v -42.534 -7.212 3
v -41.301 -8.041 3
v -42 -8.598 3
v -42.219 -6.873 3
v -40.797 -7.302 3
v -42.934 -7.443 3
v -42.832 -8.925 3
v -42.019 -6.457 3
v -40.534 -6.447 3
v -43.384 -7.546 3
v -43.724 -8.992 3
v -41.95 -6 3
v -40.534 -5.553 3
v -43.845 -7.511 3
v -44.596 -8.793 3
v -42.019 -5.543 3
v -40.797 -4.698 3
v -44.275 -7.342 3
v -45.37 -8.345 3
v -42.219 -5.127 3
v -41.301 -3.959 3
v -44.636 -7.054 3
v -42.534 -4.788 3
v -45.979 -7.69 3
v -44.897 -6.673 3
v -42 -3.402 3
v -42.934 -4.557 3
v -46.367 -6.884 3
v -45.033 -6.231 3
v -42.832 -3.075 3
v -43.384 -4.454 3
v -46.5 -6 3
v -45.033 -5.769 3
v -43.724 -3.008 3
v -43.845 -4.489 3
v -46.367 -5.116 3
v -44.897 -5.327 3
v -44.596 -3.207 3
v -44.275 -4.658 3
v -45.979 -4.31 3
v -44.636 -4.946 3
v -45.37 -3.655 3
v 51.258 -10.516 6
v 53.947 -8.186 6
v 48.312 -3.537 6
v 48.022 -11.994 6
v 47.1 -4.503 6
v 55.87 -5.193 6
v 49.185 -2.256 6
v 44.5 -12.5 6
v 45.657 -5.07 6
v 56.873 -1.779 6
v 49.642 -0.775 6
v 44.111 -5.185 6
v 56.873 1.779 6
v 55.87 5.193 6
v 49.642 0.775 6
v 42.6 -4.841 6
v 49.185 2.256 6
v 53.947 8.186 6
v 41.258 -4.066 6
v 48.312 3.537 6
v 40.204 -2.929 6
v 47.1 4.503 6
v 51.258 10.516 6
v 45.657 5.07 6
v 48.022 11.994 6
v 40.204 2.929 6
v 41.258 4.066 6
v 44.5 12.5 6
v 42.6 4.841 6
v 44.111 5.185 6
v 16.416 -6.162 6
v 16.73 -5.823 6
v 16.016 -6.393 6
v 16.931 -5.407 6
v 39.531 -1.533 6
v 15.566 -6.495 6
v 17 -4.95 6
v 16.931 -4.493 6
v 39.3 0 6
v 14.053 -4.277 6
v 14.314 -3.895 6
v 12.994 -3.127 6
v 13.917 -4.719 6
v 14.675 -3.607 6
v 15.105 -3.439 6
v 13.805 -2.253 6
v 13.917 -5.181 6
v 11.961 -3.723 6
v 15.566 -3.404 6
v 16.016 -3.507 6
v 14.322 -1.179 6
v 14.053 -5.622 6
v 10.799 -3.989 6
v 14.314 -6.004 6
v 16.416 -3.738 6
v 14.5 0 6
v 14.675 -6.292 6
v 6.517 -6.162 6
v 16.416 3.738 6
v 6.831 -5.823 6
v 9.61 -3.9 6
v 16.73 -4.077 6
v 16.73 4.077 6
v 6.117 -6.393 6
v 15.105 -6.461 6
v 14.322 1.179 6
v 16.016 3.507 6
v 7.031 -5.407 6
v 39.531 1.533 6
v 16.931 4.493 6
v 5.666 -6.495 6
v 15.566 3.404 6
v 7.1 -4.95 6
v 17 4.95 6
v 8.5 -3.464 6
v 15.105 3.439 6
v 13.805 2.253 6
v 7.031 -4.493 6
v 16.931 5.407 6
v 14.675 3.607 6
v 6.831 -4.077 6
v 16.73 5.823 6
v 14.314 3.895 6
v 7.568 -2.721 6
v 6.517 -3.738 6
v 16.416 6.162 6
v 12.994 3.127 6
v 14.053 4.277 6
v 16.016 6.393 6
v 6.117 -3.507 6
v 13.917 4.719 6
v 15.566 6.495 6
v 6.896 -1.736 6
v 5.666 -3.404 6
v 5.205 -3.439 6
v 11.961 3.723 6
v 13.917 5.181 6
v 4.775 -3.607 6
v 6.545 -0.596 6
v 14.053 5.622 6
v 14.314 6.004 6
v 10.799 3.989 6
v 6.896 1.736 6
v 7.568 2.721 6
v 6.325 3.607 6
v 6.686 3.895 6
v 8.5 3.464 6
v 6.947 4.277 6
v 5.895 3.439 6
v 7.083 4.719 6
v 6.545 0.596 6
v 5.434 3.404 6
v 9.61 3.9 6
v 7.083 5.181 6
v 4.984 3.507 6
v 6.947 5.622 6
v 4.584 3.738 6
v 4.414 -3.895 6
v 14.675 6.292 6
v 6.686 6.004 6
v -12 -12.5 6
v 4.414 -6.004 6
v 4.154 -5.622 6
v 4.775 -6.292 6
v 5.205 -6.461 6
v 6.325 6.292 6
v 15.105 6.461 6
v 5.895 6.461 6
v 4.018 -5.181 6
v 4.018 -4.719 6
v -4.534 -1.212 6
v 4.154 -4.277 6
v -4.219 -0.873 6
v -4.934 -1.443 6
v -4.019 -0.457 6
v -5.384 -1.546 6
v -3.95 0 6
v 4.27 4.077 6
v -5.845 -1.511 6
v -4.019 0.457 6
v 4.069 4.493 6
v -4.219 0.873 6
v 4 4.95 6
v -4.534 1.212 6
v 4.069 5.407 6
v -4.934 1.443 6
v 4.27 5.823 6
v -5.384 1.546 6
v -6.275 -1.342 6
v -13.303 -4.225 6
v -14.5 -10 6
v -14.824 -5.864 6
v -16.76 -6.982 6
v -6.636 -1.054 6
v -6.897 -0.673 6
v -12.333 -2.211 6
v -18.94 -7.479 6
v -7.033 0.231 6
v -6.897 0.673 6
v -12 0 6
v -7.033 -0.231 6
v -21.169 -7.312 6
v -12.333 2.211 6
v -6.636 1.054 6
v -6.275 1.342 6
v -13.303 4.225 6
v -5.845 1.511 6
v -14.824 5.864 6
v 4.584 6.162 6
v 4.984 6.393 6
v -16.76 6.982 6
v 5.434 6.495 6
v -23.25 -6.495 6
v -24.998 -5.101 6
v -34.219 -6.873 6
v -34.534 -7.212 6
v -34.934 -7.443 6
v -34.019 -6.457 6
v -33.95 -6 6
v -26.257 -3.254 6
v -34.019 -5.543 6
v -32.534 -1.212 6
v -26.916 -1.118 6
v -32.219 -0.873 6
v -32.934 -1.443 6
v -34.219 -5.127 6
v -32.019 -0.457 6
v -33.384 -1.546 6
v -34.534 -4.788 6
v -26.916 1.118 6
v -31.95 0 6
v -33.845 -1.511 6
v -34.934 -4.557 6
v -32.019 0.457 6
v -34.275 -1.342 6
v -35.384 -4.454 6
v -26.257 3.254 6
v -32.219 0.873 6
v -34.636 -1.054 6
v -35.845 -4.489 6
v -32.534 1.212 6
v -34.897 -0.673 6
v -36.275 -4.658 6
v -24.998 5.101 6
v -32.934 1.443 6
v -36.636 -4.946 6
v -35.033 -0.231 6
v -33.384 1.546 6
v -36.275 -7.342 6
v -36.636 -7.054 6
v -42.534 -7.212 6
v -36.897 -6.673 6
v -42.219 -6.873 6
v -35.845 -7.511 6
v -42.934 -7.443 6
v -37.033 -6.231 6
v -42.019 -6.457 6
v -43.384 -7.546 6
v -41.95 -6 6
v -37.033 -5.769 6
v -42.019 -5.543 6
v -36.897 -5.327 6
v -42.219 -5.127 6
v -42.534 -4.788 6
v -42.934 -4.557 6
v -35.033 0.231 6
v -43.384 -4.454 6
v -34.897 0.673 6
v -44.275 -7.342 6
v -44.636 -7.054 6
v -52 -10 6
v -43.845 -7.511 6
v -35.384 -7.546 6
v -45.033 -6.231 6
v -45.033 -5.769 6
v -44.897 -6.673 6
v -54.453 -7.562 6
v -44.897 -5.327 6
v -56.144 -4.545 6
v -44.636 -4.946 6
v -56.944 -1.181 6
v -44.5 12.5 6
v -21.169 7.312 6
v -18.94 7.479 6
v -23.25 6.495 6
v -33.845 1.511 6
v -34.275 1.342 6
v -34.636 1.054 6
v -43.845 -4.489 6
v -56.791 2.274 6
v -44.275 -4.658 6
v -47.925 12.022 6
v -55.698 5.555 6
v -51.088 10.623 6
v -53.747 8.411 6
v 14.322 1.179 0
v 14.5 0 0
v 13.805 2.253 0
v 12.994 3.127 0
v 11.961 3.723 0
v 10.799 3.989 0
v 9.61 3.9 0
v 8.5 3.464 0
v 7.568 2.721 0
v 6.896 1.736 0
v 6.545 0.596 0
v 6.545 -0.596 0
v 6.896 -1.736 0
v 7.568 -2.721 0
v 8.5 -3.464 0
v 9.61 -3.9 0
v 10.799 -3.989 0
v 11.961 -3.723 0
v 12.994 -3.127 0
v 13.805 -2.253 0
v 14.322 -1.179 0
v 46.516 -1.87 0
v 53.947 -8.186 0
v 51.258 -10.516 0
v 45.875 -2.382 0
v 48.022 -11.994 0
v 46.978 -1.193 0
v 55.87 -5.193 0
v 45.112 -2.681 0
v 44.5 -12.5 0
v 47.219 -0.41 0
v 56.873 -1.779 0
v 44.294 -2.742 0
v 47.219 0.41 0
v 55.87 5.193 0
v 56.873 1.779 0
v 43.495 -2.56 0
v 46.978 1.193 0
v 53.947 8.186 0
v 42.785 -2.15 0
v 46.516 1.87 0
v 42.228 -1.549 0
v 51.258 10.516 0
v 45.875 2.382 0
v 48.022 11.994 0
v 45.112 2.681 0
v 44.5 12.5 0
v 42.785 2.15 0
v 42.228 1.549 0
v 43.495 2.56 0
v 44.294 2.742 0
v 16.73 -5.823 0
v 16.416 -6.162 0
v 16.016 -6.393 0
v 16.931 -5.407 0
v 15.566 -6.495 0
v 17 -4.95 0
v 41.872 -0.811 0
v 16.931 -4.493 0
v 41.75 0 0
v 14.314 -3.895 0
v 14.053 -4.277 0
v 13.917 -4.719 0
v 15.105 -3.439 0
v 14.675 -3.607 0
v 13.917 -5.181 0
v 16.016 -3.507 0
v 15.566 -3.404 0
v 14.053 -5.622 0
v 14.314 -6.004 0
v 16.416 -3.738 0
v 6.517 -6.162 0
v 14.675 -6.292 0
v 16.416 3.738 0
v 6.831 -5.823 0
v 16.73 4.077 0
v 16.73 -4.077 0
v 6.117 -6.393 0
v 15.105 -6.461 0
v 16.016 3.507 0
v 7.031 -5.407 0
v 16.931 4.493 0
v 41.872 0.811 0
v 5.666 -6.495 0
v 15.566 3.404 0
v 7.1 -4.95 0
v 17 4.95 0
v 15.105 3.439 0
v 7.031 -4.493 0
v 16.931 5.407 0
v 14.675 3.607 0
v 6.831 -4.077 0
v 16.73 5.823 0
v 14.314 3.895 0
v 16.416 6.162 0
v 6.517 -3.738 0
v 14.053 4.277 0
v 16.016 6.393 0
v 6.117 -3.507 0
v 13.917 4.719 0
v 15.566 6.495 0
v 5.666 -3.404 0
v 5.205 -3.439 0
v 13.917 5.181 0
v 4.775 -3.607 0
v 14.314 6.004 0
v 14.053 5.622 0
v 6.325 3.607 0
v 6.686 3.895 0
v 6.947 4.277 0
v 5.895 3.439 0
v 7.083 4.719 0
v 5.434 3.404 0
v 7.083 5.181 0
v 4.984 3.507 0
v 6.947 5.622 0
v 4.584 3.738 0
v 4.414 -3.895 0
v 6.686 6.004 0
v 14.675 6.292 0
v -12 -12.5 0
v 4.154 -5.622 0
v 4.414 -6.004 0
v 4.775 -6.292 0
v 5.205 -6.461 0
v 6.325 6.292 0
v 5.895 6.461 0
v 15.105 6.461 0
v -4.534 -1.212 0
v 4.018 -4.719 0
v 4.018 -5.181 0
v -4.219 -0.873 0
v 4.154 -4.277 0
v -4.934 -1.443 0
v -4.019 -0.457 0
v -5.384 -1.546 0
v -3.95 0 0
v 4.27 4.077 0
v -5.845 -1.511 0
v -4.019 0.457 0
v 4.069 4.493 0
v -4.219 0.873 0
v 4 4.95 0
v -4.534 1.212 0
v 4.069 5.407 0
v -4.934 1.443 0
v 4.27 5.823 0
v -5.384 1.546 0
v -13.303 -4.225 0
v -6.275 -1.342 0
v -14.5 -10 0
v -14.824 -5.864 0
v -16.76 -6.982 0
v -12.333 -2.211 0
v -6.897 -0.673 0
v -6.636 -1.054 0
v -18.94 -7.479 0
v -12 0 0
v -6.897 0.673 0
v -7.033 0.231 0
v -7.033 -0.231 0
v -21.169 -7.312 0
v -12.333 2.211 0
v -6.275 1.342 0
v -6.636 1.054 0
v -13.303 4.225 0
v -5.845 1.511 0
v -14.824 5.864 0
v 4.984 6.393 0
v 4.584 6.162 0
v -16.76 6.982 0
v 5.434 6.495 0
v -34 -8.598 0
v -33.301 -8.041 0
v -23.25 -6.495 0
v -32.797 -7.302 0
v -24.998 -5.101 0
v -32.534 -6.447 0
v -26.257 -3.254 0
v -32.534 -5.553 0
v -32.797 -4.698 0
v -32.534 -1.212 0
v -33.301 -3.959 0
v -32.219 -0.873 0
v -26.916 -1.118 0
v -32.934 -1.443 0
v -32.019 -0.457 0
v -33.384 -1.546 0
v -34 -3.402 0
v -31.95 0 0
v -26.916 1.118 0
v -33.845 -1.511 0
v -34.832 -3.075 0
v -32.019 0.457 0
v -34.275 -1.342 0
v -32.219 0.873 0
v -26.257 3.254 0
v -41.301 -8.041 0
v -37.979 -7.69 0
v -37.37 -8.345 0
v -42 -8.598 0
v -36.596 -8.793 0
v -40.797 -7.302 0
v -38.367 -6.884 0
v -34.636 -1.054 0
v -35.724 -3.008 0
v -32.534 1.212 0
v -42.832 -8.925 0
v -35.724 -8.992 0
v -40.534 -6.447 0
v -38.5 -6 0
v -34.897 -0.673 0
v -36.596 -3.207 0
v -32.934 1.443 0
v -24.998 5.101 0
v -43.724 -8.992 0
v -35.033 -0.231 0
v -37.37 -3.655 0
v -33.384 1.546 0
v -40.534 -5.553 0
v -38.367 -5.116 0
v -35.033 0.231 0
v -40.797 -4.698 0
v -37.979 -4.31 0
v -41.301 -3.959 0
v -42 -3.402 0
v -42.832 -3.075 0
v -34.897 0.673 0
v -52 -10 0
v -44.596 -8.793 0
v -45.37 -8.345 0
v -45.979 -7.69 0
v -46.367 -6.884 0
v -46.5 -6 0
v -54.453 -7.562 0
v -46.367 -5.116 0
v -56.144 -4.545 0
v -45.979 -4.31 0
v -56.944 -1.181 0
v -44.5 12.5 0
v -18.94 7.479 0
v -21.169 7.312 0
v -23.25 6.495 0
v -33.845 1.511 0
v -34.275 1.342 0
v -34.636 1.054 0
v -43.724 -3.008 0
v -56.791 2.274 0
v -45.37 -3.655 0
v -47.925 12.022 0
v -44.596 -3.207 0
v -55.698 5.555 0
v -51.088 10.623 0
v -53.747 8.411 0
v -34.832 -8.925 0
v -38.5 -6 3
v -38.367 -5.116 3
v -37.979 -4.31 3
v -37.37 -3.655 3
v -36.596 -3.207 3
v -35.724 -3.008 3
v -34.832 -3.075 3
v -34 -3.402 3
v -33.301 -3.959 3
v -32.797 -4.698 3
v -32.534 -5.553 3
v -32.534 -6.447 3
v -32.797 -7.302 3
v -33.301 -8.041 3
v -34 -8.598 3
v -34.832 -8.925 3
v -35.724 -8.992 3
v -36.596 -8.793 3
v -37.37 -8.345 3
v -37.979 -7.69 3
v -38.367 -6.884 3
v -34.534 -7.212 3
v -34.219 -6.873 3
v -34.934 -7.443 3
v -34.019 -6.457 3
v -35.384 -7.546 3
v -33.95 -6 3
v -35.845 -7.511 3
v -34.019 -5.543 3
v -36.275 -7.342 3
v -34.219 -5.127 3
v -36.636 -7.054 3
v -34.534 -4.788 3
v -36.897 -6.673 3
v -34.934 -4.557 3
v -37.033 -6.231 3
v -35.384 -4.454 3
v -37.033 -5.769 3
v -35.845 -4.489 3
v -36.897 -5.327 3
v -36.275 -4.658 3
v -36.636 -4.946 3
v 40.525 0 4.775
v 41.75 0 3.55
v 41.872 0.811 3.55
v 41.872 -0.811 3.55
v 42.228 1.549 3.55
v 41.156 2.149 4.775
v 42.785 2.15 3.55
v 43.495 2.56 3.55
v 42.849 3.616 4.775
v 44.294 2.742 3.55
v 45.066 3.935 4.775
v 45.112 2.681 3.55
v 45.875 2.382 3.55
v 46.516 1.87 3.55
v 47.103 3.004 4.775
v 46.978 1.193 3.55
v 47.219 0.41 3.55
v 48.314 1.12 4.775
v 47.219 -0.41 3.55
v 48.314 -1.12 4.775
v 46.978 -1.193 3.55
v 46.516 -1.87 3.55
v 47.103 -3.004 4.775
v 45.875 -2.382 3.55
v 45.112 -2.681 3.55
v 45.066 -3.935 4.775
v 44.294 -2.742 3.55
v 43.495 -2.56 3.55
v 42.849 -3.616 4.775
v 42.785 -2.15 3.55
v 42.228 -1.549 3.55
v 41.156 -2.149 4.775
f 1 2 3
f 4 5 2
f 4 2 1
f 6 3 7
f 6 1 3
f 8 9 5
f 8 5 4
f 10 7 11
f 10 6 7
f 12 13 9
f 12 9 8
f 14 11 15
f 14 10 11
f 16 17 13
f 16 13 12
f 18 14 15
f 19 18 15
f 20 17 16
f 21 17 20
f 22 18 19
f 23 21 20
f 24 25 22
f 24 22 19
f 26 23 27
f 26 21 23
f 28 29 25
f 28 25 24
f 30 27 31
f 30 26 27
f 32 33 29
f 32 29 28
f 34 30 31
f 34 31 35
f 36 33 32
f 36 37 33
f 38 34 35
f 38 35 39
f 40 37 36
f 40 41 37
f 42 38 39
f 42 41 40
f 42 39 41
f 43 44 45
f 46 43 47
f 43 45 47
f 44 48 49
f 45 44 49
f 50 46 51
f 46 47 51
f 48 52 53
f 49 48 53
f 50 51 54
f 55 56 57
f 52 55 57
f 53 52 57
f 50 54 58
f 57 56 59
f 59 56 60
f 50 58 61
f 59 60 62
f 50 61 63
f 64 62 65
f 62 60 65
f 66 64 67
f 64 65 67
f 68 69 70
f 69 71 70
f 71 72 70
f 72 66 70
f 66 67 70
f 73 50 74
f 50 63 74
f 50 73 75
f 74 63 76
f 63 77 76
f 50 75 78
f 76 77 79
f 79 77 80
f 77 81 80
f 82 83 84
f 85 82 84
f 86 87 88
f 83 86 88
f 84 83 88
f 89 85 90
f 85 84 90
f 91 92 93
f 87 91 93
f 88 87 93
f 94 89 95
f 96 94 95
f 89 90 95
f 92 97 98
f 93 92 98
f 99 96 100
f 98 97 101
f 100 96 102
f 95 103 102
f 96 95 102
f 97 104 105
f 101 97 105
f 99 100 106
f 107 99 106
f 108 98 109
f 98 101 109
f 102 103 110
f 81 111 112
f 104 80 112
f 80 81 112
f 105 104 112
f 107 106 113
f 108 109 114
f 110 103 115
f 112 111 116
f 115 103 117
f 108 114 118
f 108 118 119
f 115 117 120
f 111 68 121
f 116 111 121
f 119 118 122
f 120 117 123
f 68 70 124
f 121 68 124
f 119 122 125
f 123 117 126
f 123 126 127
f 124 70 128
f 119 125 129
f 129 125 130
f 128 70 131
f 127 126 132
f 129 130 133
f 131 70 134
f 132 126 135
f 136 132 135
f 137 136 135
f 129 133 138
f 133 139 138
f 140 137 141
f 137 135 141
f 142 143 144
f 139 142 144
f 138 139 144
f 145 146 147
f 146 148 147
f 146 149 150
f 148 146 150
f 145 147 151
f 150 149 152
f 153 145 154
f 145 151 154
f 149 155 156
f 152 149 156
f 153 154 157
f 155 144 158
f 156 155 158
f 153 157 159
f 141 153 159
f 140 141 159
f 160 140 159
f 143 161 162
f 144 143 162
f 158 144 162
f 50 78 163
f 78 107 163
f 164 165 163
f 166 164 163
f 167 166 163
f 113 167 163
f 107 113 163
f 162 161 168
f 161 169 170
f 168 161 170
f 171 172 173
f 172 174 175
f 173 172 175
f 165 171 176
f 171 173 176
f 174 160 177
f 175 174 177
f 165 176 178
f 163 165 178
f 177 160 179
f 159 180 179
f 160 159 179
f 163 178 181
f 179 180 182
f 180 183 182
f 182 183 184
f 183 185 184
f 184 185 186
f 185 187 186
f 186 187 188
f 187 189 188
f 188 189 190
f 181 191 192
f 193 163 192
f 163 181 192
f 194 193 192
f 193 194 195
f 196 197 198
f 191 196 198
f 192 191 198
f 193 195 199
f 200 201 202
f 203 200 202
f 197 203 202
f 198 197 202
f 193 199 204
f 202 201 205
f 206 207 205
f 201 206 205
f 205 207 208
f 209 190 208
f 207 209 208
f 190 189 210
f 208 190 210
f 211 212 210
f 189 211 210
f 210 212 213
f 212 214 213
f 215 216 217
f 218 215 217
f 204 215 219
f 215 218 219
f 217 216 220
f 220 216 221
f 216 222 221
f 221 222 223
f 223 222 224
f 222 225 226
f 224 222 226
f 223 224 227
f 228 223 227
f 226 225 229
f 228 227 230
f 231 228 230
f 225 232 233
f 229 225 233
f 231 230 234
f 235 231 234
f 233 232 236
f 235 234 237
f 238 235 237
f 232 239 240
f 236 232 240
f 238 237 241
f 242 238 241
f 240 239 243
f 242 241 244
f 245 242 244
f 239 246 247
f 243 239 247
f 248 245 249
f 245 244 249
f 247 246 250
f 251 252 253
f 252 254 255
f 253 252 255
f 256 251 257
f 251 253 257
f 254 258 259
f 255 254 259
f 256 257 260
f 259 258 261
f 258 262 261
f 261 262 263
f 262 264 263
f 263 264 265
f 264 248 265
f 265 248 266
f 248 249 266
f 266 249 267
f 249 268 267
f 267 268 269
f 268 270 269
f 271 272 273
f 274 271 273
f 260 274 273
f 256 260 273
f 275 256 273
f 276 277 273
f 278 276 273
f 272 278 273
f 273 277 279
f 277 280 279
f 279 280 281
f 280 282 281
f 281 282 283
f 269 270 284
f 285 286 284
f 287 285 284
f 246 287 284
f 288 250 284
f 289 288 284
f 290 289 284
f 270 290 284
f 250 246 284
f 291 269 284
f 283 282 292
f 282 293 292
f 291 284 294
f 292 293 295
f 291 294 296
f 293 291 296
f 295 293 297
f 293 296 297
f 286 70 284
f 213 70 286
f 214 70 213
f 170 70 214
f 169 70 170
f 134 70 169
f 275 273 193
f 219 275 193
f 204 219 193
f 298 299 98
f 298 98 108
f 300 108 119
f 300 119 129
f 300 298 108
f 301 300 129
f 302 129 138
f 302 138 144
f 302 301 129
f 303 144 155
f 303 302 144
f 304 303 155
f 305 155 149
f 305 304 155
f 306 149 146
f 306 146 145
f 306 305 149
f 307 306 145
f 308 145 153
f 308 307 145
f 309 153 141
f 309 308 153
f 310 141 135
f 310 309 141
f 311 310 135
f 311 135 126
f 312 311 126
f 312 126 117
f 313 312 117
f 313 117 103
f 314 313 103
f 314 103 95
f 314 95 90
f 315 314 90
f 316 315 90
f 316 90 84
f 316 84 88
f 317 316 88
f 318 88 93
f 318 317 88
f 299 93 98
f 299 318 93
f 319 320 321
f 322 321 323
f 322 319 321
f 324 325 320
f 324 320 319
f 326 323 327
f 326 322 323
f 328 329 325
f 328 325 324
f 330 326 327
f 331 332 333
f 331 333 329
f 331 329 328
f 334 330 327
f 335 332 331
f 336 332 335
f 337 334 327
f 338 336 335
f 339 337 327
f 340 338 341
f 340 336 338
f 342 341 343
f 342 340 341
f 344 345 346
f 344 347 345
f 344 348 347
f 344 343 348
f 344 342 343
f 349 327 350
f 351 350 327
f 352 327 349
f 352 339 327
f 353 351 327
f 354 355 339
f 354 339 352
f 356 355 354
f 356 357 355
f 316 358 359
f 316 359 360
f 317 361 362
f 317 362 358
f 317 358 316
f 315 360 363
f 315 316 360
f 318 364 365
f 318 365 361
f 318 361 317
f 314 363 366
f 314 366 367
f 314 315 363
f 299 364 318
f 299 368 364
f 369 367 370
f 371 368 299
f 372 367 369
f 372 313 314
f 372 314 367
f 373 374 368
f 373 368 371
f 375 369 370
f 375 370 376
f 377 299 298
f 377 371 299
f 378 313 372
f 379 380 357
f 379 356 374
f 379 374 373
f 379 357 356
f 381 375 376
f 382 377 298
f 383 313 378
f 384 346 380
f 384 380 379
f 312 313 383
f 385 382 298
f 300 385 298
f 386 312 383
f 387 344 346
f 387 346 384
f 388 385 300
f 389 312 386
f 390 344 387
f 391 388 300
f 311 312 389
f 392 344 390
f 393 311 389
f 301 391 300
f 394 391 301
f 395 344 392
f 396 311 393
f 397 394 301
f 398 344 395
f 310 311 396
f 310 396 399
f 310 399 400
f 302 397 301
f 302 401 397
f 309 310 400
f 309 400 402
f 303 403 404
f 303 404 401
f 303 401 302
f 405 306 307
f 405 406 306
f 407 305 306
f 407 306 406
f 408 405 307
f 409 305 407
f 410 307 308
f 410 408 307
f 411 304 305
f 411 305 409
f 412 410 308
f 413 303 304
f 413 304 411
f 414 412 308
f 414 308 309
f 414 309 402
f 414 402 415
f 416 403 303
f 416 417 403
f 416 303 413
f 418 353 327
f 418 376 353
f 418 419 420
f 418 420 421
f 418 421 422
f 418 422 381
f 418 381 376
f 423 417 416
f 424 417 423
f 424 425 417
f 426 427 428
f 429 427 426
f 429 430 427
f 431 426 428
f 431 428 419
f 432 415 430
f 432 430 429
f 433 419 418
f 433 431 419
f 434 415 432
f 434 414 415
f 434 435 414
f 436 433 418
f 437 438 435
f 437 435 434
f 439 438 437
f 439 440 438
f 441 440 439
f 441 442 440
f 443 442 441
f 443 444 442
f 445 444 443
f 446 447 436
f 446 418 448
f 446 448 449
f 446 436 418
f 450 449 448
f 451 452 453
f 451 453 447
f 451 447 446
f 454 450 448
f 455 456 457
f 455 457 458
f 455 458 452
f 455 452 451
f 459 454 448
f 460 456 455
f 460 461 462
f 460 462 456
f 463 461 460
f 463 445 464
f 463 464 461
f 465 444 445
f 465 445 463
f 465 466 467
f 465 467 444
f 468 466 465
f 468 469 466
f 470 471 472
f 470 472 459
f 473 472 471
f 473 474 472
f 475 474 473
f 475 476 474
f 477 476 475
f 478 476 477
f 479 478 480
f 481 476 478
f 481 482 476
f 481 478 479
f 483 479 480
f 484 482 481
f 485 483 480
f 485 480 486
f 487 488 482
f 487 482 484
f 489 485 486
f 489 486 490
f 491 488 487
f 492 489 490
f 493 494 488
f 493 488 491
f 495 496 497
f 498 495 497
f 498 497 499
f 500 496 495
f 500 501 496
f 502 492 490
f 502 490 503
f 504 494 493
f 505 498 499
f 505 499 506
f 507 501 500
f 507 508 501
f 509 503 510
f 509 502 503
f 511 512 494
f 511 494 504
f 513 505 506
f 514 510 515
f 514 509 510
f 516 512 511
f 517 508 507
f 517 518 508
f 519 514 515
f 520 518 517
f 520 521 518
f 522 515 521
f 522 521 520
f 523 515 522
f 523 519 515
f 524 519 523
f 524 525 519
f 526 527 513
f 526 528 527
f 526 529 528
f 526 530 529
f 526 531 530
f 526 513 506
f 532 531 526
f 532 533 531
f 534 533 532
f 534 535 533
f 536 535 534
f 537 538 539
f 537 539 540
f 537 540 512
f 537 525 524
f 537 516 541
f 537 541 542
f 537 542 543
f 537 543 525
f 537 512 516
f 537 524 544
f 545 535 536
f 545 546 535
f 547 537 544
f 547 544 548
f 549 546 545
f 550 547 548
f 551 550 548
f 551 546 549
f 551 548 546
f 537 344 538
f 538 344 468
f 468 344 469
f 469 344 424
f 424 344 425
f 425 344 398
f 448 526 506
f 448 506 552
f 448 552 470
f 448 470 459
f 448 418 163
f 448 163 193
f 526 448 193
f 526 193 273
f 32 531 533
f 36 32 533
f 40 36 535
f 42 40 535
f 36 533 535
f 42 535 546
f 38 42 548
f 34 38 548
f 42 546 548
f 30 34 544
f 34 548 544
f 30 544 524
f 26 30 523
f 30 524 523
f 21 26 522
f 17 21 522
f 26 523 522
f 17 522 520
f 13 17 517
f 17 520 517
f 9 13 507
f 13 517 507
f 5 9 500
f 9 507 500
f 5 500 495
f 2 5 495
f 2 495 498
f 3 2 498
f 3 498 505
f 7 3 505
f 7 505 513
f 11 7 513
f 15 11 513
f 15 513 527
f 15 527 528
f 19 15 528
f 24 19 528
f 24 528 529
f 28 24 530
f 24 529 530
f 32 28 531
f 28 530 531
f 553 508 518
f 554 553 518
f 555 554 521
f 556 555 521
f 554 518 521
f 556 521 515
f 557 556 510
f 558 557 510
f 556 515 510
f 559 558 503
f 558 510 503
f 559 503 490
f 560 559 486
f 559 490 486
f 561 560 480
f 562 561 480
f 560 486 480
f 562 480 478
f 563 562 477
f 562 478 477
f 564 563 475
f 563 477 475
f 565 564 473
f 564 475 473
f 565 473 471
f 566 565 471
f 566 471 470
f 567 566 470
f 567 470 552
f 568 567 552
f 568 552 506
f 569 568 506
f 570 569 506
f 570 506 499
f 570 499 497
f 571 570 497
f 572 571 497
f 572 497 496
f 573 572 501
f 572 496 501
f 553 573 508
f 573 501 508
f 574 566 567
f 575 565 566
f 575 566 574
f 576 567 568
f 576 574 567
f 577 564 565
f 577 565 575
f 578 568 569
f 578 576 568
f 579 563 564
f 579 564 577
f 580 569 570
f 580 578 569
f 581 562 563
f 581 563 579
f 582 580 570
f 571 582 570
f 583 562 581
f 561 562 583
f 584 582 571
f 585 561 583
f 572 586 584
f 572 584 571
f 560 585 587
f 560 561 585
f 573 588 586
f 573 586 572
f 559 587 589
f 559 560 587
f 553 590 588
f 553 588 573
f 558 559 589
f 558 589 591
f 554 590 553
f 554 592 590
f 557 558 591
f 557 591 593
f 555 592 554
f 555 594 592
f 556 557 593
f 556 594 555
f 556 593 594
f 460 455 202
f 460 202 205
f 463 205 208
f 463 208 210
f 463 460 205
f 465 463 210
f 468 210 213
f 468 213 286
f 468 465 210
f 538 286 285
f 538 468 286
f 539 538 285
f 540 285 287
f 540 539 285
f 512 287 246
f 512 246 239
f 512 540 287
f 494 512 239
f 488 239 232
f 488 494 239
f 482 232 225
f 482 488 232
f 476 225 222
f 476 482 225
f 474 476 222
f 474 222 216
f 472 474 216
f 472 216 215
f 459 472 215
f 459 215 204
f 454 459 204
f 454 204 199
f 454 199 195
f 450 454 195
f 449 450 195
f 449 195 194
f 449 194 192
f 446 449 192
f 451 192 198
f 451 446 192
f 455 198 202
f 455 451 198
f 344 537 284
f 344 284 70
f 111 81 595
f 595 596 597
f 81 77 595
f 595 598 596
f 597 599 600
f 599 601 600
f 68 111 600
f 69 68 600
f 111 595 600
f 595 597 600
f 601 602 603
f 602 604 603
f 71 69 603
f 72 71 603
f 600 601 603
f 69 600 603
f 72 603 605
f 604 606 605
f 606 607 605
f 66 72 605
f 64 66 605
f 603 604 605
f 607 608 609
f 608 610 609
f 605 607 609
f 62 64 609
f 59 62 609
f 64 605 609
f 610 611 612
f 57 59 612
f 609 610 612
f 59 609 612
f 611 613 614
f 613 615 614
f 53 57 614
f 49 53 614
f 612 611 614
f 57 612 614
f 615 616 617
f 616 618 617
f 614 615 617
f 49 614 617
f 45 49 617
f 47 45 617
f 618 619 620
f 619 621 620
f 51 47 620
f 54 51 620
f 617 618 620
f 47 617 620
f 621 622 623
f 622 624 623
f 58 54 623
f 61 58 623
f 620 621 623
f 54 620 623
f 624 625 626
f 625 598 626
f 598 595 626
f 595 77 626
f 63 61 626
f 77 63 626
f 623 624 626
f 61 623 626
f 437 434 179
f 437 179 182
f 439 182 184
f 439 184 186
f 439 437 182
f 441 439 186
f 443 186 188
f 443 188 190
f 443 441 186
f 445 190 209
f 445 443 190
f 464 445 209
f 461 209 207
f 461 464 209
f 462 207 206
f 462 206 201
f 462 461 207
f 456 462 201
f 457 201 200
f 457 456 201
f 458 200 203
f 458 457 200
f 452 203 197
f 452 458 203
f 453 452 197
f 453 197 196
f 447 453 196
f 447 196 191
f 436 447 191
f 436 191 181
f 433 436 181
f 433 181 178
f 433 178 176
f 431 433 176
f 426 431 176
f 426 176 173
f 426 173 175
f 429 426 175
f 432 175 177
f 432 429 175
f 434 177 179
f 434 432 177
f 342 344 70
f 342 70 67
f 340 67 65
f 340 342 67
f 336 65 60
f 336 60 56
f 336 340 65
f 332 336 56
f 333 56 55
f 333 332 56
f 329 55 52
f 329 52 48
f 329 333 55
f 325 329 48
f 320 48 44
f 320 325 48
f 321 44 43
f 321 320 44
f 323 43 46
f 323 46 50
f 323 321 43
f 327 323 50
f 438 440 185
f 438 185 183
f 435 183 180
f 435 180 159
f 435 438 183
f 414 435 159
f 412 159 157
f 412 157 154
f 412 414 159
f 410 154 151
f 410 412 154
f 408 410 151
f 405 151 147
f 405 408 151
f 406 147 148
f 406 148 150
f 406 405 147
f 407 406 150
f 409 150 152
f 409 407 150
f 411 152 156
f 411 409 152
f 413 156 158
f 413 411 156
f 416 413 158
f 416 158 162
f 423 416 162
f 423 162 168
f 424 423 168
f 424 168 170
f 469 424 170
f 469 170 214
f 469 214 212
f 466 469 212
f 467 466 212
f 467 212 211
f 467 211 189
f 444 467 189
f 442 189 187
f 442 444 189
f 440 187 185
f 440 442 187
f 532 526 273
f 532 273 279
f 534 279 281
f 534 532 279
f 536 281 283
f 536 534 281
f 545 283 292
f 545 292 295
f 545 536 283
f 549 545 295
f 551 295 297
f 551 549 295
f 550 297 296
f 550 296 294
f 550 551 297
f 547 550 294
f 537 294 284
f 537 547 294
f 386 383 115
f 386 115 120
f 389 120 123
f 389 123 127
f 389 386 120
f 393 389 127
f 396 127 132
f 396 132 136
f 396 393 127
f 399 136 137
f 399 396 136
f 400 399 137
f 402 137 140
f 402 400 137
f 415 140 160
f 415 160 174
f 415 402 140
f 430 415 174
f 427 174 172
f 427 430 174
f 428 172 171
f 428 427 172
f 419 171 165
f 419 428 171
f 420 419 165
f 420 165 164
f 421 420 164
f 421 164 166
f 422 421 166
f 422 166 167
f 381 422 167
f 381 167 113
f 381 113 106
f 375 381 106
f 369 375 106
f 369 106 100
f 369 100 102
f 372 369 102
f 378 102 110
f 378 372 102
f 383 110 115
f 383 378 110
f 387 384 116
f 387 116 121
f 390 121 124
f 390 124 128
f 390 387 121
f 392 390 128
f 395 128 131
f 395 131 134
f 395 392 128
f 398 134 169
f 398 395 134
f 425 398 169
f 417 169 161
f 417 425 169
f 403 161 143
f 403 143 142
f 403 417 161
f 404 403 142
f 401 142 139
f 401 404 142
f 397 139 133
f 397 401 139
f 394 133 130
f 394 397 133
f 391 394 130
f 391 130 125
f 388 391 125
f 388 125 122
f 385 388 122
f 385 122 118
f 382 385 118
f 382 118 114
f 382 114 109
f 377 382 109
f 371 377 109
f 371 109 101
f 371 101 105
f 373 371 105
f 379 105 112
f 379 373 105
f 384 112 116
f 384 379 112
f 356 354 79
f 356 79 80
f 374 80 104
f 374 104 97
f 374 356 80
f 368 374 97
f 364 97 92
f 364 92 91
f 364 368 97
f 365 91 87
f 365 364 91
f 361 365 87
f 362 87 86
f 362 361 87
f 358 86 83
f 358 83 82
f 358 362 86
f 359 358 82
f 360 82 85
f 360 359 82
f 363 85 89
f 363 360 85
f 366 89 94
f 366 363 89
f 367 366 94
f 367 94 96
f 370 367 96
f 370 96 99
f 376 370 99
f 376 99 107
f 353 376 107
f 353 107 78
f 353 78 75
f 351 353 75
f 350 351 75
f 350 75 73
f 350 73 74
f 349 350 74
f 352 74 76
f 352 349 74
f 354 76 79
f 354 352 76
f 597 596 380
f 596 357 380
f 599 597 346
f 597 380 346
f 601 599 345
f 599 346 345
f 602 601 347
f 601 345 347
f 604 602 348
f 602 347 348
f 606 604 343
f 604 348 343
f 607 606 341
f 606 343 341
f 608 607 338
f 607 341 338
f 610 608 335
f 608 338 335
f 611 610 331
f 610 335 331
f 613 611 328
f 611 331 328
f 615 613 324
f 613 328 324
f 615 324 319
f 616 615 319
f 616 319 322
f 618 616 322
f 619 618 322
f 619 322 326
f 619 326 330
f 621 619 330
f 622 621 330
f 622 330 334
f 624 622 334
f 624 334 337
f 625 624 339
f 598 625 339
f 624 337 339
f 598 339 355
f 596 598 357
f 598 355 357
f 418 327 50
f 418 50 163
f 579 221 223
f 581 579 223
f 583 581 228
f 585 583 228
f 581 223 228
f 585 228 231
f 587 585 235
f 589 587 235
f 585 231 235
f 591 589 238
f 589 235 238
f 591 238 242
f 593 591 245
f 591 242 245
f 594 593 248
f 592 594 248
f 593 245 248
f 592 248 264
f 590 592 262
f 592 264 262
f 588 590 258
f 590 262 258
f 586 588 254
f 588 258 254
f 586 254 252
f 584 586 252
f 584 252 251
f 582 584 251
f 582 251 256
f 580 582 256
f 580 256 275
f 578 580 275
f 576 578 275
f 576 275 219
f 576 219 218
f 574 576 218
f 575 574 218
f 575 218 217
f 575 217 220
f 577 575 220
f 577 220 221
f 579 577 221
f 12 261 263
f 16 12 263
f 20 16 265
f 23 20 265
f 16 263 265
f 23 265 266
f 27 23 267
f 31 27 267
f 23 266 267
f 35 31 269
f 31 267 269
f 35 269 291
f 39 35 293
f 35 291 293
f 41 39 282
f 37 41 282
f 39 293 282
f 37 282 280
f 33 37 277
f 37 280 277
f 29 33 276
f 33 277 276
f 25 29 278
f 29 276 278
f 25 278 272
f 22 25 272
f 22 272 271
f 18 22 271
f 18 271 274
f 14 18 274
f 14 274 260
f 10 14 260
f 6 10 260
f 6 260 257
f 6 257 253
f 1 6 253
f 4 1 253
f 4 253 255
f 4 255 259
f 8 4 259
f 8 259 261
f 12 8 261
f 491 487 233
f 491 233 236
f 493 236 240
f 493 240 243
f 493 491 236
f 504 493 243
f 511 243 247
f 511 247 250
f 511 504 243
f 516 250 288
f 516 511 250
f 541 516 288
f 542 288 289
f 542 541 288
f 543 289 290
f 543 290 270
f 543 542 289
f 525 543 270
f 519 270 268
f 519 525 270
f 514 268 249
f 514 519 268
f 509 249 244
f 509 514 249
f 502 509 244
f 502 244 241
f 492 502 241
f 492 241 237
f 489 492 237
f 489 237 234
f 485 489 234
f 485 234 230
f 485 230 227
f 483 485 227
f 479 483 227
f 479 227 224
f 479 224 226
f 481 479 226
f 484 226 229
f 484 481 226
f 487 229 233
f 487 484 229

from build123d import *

# Parameters (mm, degrees)
SKETCH1_R                                       = 4
SKETCH1_R_2                                     = 1.55
SKETCH1_R_3                                     = 7.5
BOSS_EXTRUDE1_DEPTH                             = 6
CSK_FOR_M5_FLAT_HEAD_MACHINE_SCREW1_D           = 5.5
CSK_FOR_M5_FLAT_HEAD_MACHINE_SCREW1_CSINK_D     = 10.4
CSK_FOR_M5_FLAT_HEAD_MACHINE_SCREW1_CSINK_ANGLE = 90
SKETCH4_R                                       = 1.55
SKETCH4_R_2                                     = 7.5
CUT_EXTRUDE1_DEPTH                              = 59.662168388
SKETCH6_R                                       = 3
CUT_EXTRUDE3_DEPTH                              = 3


with BuildPart() as part:
    # Sketch1 → Boss-Extrude1 (new body)
    with BuildSketch(Plane.XY):
        with BuildLine():
            Line((-44.5, 12.5), (44.5, 12.5))
            ThreePointArc((44.5, 12.5), (57, 0), (44.5, -12.5))
            Line((44.5, -12.5), (-12, -12.5))
            Line((-12, -12.5), (-14.5, -10))
            Line((-14.5, -10), (-52, -10))
            ThreePointArc((-52, -10), (-56.358541226, 3.952847075), (-44.5, 12.5))
        make_face()
        with Locations((10.5, 0)):
            Circle(SKETCH1_R, mode=Mode.SUBTRACT)
        with Locations((15.449747468, 4.949747468)):
            Circle(SKETCH1_R_2, mode=Mode.SUBTRACT)
        with Locations(Location((5.550252532, 4.949747468, 0), (0, 0, 180))):
            Circle(SKETCH1_R_2, mode=Mode.SUBTRACT)
        with Locations((5.550252532, -4.949747468)):
            Circle(SKETCH1_R_2, mode=Mode.SUBTRACT)
        with Locations((15.449747468, -4.949747468)):
            Circle(SKETCH1_R_2, mode=Mode.SUBTRACT)
        with Locations((-33.5, 0)):
            Circle(SKETCH1_R_2, mode=Mode.SUBTRACT)
        with Locations((-19.5, 0)):
            Circle(SKETCH1_R_3, mode=Mode.SUBTRACT)
        with Locations((-5.5, 0)):
            Circle(SKETCH1_R_2, mode=Mode.SUBTRACT)
    extrude(amount=BOSS_EXTRUDE1_DEPTH)

    # CSK for M5 Flat Head Machine Screw1 (through all)
    with Locations(Plane.XY.offset(6)):
        with Locations((44.5, 0)):
            CounterSinkHole(CSK_FOR_M5_FLAT_HEAD_MACHINE_SCREW1_D / 2, CSK_FOR_M5_FLAT_HEAD_MACHINE_SCREW1_CSINK_D / 2, counter_sink_angle=CSK_FOR_M5_FLAT_HEAD_MACHINE_SCREW1_CSINK_ANGLE)

    # Sketch4 → Cut-Extrude1 (cut, through all)
    with BuildSketch(Plane.XY.offset(6)):
        with Locations((-43.5, -6)):
            Circle(SKETCH4_R)
        with Locations((-35.5, -6)):
            Circle(SKETCH4_R)
        with Locations((-19.5, 0)):
            Circle(SKETCH4_R_2)
    extrude(amount=-CUT_EXTRUDE1_DEPTH, mode=Mode.SUBTRACT)

    # Sketch6 → Cut-Extrude3 (cut)
    with BuildSketch(Plane(origin=(0, 0, 0), x_dir=(-1, 0, 0), z_dir=(0, 0, -1))):
        with Locations((43.5, -6)):
            Circle(SKETCH6_R)
        with Locations((35.5, -6)):
            Circle(SKETCH6_R)
    extrude(amount=-CUT_EXTRUDE3_DEPTH, mode=Mode.SUBTRACT)


solid = part.part
